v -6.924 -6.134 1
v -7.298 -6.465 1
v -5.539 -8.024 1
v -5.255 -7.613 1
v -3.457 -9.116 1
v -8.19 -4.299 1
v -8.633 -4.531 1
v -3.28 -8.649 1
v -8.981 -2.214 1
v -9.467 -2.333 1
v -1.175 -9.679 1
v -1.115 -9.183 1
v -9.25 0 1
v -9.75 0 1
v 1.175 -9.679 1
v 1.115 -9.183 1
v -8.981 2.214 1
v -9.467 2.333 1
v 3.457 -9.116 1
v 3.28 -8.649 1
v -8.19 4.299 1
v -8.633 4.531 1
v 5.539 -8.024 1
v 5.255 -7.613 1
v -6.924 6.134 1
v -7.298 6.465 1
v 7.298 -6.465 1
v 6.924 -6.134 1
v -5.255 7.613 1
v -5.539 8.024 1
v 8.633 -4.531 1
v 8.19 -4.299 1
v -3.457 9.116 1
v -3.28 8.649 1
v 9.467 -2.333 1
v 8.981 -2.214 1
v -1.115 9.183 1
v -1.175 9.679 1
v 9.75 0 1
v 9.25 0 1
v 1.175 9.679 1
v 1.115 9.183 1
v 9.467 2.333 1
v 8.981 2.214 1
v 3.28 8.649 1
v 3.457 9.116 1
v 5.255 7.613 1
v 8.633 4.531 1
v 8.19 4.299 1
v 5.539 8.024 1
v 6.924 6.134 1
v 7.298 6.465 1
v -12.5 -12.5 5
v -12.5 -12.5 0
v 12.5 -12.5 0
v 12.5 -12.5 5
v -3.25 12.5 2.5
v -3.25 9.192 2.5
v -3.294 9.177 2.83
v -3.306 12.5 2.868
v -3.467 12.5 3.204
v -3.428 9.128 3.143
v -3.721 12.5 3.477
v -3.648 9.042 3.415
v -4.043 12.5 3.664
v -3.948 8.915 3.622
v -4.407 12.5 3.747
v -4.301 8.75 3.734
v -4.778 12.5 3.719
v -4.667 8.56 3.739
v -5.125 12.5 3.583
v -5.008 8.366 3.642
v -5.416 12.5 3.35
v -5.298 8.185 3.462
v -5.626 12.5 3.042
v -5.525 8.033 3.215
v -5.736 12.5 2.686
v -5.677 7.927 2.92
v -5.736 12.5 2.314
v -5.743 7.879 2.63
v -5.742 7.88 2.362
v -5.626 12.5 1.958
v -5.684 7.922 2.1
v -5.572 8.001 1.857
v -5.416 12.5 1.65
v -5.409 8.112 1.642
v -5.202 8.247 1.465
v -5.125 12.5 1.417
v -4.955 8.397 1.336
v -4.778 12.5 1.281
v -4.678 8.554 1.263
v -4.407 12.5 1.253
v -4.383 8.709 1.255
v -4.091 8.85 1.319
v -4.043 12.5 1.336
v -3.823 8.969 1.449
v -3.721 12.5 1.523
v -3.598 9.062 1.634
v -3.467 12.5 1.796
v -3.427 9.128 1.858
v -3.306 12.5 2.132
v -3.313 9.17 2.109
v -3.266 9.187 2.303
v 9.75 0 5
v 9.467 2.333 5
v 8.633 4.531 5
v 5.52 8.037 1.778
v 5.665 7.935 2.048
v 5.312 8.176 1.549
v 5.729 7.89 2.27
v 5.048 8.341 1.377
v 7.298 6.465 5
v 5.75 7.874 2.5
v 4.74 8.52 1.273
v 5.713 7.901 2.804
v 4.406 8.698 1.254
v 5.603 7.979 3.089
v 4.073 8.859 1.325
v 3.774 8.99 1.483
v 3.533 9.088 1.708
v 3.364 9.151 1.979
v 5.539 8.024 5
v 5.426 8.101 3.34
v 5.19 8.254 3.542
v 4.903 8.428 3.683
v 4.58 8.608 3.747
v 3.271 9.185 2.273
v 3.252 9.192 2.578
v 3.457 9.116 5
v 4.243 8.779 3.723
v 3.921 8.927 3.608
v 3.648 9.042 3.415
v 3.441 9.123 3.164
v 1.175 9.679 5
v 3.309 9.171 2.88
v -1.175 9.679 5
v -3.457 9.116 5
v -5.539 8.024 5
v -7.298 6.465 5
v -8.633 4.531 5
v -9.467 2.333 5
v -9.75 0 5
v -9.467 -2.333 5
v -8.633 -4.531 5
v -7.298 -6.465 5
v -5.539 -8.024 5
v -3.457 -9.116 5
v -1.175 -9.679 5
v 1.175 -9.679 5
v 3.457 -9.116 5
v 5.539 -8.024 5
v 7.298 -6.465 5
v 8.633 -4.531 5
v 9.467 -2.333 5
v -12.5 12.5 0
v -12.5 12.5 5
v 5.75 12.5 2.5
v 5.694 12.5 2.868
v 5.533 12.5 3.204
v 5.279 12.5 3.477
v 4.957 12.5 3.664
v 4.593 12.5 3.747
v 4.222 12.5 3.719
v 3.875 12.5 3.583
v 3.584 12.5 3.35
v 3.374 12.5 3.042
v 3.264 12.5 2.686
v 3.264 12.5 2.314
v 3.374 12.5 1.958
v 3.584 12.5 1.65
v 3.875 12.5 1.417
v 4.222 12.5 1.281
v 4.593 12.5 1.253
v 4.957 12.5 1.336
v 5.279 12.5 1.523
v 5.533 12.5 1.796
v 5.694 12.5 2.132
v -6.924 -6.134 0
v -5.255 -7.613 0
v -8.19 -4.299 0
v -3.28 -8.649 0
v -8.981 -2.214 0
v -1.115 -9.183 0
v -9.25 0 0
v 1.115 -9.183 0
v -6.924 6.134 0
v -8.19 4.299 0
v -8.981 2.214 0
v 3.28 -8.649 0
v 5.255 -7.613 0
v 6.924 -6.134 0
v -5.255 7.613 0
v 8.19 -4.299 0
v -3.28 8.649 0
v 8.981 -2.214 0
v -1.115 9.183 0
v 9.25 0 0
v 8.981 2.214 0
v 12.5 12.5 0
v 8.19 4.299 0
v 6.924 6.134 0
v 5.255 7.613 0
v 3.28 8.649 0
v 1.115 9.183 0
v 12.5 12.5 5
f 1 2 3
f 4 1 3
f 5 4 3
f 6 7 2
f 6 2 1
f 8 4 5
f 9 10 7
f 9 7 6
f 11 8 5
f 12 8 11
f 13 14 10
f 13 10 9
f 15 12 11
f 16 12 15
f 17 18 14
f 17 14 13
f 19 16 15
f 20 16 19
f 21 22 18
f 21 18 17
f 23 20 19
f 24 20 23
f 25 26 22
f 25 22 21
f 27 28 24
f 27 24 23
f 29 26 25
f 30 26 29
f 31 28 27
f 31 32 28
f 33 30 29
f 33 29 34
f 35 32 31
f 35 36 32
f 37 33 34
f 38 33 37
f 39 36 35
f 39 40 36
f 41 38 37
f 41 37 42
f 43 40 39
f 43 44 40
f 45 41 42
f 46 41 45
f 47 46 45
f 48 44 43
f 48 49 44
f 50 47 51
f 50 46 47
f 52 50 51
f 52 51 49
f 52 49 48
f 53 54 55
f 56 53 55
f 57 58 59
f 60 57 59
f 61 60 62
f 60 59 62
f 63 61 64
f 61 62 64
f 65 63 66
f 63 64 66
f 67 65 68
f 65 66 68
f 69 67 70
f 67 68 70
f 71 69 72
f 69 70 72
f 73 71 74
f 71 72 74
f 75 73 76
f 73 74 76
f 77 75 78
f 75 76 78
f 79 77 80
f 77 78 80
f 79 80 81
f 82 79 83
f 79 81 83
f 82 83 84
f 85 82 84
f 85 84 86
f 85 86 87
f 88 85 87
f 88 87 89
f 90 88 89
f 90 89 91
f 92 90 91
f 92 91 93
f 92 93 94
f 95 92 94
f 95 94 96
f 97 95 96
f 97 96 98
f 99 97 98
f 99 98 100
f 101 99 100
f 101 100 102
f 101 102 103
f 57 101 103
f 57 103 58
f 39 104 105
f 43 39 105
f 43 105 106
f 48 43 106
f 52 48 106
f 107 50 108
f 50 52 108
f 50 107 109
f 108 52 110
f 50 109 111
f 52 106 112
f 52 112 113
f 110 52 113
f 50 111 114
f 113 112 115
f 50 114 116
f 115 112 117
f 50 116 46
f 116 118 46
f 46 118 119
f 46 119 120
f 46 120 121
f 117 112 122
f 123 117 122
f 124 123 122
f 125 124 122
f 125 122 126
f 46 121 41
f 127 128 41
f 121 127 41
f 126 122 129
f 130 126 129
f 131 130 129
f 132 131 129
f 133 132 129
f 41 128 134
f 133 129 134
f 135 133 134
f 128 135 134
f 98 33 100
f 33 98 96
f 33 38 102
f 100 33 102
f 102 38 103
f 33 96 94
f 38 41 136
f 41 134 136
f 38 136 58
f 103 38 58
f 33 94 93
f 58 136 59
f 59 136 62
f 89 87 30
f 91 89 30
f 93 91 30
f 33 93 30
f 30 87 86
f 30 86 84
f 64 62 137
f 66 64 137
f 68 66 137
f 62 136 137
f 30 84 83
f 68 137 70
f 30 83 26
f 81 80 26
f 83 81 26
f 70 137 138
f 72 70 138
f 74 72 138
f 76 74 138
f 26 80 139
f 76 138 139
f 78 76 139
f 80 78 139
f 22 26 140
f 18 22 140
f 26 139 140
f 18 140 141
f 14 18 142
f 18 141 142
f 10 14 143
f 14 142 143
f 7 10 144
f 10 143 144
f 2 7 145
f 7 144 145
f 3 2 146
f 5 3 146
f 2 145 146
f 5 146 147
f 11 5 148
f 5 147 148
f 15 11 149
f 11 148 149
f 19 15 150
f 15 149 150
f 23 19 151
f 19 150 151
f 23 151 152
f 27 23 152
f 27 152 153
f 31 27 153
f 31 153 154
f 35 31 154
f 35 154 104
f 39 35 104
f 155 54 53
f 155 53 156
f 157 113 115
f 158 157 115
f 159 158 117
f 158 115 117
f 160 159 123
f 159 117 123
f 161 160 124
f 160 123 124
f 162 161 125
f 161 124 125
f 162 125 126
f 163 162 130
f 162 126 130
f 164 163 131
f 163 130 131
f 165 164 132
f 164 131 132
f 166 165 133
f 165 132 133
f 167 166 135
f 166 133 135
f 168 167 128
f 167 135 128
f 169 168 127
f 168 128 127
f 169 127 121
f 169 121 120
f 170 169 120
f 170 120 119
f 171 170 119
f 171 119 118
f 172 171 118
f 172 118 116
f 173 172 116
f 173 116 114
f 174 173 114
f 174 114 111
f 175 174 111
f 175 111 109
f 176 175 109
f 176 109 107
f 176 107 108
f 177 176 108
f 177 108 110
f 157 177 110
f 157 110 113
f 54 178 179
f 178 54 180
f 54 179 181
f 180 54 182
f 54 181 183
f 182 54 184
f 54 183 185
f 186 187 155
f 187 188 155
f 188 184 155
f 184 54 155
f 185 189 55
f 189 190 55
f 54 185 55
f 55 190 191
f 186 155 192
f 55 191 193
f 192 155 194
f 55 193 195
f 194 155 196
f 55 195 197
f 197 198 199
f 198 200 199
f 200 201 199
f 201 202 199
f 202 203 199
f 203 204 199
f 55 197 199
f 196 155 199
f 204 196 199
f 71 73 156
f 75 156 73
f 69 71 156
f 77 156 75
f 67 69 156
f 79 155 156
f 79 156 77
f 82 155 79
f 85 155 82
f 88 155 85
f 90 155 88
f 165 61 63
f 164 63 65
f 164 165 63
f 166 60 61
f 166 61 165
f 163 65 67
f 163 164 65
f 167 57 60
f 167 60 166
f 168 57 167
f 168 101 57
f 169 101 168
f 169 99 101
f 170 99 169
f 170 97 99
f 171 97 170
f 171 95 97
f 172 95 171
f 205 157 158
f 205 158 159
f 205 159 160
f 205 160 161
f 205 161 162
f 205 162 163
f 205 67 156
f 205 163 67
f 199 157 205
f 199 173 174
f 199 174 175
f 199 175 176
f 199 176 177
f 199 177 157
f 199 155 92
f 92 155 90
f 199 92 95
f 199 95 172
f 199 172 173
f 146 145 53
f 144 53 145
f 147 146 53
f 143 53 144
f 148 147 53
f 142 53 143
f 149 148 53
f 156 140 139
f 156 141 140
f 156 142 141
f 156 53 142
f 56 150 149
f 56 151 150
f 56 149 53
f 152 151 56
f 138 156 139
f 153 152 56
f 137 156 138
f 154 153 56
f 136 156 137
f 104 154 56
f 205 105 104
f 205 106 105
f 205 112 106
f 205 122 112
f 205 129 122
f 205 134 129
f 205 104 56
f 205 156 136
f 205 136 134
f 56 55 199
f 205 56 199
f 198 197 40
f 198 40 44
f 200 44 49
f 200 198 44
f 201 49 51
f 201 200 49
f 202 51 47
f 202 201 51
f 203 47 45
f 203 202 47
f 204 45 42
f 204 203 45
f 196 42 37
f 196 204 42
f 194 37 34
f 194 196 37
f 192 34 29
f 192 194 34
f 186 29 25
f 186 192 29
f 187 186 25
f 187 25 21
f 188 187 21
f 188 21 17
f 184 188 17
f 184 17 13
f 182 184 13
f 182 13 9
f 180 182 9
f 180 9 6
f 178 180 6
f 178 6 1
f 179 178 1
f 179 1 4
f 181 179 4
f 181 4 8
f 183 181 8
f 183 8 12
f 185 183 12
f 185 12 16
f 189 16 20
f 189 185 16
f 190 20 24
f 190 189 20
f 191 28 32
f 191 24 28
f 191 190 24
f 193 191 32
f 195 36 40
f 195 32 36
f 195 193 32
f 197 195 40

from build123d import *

# Parameters (mm, degrees)
SKETCH1_W                 = 25
SKETCH1_H                 = 25
SKETCH1_R                 = 9.25
BOSS_EXTRUDE1_DEPTH       = 5
M3X0_5_TAPPED_HOLE1_D     = 2.5
M3X0_5_TAPPED_HOLE1_DEPTH = 7.5
M3X0_5_TAPPED_HOLE1_TIP   = 0.751075774
SKETCH4_R                 = 9.75
CUT_EXTRUDE1_DEPTH        = 4


with BuildPart() as part:
    # Sketch1 → Boss-Extrude1 (new body)
    with BuildSketch(Plane.XY):
        Rectangle(SKETCH1_W, SKETCH1_H)
        Circle(SKETCH1_R, mode=Mode.SUBTRACT)
    extrude(amount=BOSS_EXTRUDE1_DEPTH)

    # M3x0.5 Tapped Hole1
    with Locations(Plane(origin=(0, 12.5, 0), x_dir=(-1, 0, 0), z_dir=(0, 1, 0))):
        with Locations((4.5, 2.5), (-4.5, 2.5)):
            Hole(M3X0_5_TAPPED_HOLE1_D / 2, depth=M3X0_5_TAPPED_HOLE1_DEPTH)
            with Locations((0, 0, -(M3X0_5_TAPPED_HOLE1_DEPTH + M3X0_5_TAPPED_HOLE1_TIP / 2))):  # 118° drill point
                Cone(0, M3X0_5_TAPPED_HOLE1_D / 2, M3X0_5_TAPPED_HOLE1_TIP, mode=Mode.SUBTRACT)

    # Sketch4 → Cut-Extrude1 (cut)
    with BuildSketch(Plane.XY.offset(5)):
        Circle(SKETCH4_R)
    extrude(amount=-CUT_EXTRUDE1_DEPTH, mode=Mode.SUBTRACT)


solid = part.part
